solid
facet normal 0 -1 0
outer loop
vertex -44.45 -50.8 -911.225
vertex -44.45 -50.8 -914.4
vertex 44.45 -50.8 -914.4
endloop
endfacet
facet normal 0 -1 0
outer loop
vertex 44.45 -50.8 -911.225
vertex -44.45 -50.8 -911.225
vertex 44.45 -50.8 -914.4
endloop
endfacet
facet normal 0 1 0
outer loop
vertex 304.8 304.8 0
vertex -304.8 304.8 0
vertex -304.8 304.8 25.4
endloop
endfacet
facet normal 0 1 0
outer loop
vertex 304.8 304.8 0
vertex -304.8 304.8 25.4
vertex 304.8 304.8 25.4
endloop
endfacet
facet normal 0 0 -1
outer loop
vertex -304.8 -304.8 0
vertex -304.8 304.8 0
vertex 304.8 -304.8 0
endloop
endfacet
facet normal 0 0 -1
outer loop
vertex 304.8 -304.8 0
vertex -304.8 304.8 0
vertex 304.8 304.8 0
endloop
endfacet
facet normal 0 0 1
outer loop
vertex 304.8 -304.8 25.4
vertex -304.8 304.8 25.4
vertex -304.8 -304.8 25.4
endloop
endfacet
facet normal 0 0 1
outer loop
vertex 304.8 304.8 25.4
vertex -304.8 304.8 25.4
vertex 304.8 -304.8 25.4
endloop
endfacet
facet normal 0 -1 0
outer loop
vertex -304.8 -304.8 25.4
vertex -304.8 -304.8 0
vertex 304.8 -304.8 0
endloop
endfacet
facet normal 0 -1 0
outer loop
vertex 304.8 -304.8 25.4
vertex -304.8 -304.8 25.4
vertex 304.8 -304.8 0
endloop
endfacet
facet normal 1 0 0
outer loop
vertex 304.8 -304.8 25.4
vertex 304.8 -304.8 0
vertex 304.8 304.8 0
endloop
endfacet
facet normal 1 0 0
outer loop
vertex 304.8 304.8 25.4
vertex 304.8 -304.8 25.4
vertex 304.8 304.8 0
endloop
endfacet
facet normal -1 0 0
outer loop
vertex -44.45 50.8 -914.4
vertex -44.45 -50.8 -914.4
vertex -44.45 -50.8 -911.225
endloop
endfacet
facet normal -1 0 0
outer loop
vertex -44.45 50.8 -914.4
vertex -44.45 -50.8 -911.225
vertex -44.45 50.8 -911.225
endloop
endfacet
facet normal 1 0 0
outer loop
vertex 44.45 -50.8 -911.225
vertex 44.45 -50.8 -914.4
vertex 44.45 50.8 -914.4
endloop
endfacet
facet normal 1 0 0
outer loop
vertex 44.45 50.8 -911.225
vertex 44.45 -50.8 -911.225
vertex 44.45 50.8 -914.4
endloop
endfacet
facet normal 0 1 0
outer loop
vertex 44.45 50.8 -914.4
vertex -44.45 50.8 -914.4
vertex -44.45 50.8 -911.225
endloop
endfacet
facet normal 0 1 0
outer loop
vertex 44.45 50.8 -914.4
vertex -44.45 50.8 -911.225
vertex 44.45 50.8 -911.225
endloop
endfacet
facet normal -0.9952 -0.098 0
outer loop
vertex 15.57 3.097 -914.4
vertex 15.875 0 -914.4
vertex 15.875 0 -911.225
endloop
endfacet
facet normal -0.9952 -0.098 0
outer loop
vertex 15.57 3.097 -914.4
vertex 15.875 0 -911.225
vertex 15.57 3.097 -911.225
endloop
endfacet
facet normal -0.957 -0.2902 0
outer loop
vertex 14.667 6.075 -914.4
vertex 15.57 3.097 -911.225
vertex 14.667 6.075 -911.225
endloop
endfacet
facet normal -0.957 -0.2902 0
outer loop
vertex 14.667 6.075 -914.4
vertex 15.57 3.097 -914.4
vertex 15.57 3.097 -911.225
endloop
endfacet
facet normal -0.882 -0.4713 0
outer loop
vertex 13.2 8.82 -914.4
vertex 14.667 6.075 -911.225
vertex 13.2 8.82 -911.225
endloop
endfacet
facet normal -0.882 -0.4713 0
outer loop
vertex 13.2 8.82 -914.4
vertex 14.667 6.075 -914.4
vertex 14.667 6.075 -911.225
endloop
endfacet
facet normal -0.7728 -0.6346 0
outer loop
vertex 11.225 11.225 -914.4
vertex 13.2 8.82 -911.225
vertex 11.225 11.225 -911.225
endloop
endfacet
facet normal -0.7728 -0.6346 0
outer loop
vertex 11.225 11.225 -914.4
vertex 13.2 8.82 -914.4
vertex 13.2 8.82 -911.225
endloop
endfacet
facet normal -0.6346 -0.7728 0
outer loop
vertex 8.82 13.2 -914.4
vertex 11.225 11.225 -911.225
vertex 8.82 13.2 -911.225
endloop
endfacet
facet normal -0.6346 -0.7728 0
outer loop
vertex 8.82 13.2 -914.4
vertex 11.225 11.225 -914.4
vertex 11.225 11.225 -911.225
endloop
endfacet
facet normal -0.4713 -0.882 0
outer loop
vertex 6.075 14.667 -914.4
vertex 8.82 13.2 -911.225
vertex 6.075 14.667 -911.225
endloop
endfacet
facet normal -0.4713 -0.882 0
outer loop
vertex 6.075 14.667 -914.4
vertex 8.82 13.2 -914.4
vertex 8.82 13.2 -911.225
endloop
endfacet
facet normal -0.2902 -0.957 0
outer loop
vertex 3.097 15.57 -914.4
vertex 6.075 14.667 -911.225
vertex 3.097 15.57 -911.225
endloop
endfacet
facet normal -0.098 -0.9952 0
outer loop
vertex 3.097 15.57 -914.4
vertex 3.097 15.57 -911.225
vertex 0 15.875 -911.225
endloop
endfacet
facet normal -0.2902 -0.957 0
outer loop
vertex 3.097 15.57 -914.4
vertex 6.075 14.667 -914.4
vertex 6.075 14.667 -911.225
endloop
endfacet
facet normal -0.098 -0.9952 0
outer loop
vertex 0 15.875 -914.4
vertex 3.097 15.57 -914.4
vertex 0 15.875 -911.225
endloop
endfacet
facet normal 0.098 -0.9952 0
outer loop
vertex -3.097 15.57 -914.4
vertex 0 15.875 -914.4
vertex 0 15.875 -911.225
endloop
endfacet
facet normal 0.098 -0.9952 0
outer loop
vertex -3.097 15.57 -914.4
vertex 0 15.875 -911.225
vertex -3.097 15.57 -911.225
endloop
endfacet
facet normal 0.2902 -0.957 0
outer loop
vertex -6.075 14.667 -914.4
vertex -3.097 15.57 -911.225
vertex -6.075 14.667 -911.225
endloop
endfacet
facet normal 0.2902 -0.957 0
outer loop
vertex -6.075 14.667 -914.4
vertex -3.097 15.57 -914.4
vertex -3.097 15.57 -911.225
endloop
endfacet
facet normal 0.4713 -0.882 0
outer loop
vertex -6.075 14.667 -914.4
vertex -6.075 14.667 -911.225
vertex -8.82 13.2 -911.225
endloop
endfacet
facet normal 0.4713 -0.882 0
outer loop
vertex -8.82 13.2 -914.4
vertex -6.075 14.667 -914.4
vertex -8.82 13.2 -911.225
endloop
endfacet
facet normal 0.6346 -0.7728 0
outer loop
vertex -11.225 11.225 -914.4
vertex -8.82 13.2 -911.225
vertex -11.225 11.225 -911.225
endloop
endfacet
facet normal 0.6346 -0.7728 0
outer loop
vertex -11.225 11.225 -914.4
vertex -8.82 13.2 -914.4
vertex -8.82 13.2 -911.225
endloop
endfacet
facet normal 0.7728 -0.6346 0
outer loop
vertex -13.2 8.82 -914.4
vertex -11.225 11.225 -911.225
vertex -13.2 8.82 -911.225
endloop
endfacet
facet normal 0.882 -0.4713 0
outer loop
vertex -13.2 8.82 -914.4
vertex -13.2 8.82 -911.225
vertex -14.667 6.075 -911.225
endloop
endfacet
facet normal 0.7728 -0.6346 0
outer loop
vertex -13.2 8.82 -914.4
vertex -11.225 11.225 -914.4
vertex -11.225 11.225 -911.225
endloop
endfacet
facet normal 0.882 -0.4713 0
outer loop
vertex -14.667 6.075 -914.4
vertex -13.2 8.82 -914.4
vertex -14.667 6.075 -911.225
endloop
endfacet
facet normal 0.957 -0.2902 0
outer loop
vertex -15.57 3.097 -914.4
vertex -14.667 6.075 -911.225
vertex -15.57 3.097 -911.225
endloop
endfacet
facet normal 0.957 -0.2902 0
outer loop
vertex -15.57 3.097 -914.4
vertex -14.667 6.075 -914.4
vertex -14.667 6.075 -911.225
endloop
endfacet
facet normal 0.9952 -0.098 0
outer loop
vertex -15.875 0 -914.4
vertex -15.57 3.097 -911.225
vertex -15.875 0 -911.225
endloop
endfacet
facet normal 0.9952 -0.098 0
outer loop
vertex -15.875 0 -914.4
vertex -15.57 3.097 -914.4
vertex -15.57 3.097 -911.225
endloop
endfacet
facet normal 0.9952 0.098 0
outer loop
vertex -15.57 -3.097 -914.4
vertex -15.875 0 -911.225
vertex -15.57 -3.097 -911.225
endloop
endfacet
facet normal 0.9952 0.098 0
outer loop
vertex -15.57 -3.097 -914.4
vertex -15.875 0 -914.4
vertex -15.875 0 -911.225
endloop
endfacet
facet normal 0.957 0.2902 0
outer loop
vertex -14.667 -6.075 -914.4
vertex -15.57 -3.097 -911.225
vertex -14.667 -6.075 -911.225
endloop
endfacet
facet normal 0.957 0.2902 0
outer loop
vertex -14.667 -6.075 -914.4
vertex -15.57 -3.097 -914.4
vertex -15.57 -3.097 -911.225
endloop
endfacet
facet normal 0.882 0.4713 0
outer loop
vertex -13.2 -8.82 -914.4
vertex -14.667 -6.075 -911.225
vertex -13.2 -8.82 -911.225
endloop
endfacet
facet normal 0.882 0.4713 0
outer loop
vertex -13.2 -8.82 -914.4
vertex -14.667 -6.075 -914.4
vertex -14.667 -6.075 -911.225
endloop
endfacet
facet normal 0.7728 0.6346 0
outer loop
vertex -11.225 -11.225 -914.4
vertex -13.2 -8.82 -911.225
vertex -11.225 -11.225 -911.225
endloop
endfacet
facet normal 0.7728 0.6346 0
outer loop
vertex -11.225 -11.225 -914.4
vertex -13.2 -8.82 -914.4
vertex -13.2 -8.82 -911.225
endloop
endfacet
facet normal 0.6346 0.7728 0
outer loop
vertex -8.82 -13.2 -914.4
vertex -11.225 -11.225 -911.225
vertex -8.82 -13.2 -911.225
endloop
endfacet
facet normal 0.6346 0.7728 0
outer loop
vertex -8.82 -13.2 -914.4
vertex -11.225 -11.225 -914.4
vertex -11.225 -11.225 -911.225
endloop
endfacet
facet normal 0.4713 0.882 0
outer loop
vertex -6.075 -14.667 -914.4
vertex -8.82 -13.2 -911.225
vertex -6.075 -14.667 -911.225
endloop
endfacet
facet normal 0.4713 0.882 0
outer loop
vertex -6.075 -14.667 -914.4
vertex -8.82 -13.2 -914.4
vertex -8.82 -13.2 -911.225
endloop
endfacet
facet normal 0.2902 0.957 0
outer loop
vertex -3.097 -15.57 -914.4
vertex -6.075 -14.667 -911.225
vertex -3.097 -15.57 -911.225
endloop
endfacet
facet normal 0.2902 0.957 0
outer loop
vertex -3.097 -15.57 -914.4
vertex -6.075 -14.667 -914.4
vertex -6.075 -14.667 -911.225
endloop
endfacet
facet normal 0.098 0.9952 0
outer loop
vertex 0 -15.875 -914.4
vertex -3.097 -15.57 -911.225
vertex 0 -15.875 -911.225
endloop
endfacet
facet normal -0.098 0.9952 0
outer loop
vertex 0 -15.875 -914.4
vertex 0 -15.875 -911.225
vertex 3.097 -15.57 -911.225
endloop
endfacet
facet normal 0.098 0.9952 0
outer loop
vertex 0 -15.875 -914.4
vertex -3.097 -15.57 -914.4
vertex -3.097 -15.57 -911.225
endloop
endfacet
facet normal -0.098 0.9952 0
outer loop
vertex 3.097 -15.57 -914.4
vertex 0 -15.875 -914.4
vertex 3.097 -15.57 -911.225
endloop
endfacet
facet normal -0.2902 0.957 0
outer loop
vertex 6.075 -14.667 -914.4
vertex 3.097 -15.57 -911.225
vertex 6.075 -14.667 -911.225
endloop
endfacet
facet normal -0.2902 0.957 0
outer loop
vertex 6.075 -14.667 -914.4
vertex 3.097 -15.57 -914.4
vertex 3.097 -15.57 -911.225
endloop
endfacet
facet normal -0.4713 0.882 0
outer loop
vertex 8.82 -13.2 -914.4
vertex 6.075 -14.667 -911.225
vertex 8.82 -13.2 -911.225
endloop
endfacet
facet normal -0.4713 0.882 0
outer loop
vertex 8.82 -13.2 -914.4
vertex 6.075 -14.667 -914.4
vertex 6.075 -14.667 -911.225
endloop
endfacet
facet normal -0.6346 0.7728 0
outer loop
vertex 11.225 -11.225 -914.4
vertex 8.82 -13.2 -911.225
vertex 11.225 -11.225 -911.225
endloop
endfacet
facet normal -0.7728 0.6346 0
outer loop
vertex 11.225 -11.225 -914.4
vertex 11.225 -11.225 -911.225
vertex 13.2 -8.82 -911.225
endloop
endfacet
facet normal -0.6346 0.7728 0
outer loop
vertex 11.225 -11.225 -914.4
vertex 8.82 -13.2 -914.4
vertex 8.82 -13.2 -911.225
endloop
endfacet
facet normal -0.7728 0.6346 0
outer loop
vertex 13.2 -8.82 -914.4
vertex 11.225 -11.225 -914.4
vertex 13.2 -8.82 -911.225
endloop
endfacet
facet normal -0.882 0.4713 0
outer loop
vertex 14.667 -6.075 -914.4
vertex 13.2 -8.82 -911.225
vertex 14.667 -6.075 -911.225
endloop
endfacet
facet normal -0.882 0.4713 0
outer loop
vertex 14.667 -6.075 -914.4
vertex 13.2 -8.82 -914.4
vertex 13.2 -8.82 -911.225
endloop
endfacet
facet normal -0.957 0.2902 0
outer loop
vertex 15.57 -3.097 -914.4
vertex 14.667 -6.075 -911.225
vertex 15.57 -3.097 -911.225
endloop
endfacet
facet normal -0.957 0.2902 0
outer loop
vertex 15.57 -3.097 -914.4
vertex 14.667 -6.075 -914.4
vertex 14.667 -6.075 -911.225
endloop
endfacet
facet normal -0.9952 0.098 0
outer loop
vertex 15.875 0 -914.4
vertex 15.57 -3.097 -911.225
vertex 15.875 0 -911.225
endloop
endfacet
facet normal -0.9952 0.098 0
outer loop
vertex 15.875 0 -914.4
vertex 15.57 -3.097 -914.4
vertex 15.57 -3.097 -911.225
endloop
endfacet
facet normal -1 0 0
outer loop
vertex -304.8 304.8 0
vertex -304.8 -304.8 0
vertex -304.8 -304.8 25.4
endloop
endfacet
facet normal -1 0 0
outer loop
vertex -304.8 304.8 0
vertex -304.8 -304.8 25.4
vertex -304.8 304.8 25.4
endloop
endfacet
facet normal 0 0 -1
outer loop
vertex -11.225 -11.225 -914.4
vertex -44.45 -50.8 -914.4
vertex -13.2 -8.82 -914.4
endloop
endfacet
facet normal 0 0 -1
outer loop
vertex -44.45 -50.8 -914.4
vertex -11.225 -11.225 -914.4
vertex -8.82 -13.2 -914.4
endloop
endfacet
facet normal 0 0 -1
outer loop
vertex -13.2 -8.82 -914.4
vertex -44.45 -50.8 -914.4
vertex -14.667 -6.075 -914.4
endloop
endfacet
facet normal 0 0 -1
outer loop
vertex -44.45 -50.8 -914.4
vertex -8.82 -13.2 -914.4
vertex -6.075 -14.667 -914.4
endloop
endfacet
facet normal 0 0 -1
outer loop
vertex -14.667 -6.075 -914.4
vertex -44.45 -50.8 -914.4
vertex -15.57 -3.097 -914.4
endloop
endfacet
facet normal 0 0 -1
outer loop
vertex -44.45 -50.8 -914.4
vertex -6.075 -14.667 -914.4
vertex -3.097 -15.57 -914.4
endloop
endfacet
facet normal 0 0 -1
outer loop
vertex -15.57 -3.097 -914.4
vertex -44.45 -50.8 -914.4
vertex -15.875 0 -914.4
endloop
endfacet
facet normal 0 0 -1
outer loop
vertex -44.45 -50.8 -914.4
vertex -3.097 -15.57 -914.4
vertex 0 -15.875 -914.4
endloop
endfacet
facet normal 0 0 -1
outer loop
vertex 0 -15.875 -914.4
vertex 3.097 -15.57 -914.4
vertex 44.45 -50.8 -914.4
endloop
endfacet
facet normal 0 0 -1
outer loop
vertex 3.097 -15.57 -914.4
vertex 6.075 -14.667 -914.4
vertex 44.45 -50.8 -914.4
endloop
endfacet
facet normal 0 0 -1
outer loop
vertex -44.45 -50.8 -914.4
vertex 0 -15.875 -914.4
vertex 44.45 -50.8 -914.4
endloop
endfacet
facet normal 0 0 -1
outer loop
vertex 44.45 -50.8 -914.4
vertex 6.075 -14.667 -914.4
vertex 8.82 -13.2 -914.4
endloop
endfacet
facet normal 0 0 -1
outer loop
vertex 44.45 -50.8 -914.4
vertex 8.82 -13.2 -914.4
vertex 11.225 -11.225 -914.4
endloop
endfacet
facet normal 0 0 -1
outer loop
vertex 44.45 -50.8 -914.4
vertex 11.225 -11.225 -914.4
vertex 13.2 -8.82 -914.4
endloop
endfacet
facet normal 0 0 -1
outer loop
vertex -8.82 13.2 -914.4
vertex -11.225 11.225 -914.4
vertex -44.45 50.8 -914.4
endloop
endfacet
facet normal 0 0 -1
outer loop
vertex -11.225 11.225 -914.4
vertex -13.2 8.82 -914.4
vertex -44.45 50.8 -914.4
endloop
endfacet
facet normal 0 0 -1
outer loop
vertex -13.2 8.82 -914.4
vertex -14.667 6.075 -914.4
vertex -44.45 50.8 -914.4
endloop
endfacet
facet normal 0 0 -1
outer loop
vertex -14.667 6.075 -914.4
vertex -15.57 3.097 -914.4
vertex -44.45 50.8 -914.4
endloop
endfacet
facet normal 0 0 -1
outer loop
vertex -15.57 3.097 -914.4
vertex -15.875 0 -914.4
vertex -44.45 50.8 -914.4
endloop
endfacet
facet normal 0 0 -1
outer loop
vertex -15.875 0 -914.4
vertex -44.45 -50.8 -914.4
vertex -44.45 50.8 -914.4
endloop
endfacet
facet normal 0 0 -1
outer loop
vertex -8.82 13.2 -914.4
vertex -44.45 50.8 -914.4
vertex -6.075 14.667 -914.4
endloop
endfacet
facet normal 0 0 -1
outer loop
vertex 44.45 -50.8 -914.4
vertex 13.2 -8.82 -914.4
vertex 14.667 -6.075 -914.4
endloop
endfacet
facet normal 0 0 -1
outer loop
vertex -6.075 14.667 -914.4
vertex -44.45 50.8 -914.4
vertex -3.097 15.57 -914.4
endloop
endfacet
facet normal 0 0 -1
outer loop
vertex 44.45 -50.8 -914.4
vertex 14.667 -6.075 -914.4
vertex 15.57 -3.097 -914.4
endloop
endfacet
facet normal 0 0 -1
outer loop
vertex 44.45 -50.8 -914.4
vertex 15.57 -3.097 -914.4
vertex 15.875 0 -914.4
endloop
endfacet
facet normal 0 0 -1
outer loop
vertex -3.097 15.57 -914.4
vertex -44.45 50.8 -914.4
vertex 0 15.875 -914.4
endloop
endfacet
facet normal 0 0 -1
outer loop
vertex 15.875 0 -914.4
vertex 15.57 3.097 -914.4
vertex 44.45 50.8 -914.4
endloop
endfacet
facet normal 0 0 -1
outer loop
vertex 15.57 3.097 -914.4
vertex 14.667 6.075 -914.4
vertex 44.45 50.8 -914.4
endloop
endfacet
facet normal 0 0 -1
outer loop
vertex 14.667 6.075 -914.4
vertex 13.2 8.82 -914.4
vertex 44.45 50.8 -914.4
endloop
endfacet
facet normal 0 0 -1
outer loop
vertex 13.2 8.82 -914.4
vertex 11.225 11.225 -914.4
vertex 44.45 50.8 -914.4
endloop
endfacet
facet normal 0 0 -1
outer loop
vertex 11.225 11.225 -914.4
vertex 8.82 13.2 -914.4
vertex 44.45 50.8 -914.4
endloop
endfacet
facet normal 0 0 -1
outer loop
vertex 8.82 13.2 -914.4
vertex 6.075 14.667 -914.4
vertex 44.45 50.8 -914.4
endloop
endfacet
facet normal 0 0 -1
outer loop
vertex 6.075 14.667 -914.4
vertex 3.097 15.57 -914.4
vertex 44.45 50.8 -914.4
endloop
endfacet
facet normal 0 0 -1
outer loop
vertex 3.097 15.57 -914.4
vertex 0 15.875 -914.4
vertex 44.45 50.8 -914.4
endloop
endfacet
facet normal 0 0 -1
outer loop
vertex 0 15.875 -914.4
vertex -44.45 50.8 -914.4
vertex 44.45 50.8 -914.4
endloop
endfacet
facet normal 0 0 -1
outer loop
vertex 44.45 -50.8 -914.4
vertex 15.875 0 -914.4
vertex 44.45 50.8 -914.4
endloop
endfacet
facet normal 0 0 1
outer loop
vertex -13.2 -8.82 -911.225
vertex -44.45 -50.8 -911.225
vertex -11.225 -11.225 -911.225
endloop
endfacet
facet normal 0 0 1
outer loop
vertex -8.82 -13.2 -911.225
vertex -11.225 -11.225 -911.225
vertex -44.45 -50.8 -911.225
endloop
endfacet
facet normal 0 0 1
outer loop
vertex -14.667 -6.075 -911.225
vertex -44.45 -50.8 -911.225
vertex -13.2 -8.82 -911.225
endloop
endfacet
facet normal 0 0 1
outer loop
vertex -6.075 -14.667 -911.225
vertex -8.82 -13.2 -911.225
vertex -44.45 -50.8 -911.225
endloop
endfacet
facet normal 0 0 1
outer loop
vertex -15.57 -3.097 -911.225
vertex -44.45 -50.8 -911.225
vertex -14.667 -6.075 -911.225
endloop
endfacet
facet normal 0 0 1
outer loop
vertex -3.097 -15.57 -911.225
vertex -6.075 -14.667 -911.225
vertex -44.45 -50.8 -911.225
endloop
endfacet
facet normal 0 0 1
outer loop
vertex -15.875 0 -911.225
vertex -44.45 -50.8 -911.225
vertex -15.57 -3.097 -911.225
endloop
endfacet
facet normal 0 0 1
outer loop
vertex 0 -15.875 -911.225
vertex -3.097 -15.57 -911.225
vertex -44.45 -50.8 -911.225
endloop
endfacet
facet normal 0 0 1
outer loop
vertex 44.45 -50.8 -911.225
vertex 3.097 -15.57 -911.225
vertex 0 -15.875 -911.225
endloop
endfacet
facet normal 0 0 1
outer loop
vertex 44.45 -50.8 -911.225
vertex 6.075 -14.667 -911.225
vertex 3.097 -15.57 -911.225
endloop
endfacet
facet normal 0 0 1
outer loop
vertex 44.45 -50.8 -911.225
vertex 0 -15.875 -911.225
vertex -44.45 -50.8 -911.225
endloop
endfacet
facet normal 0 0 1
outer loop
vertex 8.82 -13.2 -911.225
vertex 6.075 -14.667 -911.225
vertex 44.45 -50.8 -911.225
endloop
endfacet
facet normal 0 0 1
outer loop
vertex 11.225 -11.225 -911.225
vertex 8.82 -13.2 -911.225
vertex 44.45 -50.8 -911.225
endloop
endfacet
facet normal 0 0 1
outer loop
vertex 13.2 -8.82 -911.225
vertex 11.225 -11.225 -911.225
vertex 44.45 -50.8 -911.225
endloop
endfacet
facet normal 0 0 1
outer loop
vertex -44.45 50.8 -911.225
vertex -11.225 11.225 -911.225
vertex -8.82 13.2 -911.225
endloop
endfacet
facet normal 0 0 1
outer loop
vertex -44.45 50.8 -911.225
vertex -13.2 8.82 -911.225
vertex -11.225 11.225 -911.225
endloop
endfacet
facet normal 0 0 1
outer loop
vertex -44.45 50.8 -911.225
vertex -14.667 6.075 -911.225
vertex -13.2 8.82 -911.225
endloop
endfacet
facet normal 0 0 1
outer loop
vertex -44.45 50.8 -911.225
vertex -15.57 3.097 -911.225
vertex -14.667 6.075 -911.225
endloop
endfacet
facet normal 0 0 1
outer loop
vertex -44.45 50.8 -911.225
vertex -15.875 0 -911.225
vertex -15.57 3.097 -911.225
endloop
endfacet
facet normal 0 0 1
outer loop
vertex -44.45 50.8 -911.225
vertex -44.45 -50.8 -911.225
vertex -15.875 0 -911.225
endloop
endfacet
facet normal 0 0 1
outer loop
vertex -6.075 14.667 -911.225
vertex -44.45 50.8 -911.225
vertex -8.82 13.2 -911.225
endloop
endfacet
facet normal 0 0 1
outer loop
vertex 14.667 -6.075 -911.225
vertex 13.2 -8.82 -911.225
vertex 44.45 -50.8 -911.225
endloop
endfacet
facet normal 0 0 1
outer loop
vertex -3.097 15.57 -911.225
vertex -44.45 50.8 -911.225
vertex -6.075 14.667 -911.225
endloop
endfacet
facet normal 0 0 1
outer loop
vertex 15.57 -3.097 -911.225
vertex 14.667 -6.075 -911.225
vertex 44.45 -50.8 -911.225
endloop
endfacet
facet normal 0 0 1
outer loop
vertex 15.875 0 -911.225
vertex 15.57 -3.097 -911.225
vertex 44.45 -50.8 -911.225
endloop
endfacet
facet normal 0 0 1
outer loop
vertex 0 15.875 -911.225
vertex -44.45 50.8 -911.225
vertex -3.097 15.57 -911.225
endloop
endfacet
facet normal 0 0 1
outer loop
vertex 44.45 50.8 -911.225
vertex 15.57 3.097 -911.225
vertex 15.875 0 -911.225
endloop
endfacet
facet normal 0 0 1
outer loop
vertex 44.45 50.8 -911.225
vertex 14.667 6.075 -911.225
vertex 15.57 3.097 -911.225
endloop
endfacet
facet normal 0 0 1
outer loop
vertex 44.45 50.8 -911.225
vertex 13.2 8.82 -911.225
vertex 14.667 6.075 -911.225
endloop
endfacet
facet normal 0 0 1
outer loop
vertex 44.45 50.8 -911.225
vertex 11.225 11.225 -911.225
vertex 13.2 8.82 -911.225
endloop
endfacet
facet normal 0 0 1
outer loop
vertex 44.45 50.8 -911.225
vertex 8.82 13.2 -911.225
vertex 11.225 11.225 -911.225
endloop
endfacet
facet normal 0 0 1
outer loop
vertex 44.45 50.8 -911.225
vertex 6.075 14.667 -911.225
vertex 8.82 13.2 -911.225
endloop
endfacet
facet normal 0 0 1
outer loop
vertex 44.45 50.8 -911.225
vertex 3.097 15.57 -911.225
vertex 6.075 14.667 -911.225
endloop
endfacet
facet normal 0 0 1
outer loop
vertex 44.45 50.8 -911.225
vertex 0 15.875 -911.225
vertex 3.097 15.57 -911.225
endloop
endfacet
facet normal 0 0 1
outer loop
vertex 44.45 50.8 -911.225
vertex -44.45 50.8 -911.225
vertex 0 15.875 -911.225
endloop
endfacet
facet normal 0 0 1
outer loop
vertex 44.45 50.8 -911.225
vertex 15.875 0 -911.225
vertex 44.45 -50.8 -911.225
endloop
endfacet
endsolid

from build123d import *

# Parameters (mm, degrees)
F0_W     = 609.6
F0_H     = 609.6
F6_DEPTH = 25.4
F5_W     = 88.9
F5_H     = 101.6
F5_R     = 15.875
F7_DEPTH = 3.175


with BuildPart() as f6:
    # F0 (on Top) → F6 (new body)
    with BuildSketch(Plane.XY):
        Rectangle(F0_W, F0_H)
    extrude(amount=F6_DEPTH)


with BuildPart() as f7:
    # F5 (on offset) → F7 (new body)
    with BuildSketch(Plane.XY.offset(-914.4)):
        Rectangle(F5_W, F5_H)
        Circle(F5_R, mode=Mode.SUBTRACT)
    extrude(amount=F7_DEPTH)


solid = Compound([f6.part, f7.part])
